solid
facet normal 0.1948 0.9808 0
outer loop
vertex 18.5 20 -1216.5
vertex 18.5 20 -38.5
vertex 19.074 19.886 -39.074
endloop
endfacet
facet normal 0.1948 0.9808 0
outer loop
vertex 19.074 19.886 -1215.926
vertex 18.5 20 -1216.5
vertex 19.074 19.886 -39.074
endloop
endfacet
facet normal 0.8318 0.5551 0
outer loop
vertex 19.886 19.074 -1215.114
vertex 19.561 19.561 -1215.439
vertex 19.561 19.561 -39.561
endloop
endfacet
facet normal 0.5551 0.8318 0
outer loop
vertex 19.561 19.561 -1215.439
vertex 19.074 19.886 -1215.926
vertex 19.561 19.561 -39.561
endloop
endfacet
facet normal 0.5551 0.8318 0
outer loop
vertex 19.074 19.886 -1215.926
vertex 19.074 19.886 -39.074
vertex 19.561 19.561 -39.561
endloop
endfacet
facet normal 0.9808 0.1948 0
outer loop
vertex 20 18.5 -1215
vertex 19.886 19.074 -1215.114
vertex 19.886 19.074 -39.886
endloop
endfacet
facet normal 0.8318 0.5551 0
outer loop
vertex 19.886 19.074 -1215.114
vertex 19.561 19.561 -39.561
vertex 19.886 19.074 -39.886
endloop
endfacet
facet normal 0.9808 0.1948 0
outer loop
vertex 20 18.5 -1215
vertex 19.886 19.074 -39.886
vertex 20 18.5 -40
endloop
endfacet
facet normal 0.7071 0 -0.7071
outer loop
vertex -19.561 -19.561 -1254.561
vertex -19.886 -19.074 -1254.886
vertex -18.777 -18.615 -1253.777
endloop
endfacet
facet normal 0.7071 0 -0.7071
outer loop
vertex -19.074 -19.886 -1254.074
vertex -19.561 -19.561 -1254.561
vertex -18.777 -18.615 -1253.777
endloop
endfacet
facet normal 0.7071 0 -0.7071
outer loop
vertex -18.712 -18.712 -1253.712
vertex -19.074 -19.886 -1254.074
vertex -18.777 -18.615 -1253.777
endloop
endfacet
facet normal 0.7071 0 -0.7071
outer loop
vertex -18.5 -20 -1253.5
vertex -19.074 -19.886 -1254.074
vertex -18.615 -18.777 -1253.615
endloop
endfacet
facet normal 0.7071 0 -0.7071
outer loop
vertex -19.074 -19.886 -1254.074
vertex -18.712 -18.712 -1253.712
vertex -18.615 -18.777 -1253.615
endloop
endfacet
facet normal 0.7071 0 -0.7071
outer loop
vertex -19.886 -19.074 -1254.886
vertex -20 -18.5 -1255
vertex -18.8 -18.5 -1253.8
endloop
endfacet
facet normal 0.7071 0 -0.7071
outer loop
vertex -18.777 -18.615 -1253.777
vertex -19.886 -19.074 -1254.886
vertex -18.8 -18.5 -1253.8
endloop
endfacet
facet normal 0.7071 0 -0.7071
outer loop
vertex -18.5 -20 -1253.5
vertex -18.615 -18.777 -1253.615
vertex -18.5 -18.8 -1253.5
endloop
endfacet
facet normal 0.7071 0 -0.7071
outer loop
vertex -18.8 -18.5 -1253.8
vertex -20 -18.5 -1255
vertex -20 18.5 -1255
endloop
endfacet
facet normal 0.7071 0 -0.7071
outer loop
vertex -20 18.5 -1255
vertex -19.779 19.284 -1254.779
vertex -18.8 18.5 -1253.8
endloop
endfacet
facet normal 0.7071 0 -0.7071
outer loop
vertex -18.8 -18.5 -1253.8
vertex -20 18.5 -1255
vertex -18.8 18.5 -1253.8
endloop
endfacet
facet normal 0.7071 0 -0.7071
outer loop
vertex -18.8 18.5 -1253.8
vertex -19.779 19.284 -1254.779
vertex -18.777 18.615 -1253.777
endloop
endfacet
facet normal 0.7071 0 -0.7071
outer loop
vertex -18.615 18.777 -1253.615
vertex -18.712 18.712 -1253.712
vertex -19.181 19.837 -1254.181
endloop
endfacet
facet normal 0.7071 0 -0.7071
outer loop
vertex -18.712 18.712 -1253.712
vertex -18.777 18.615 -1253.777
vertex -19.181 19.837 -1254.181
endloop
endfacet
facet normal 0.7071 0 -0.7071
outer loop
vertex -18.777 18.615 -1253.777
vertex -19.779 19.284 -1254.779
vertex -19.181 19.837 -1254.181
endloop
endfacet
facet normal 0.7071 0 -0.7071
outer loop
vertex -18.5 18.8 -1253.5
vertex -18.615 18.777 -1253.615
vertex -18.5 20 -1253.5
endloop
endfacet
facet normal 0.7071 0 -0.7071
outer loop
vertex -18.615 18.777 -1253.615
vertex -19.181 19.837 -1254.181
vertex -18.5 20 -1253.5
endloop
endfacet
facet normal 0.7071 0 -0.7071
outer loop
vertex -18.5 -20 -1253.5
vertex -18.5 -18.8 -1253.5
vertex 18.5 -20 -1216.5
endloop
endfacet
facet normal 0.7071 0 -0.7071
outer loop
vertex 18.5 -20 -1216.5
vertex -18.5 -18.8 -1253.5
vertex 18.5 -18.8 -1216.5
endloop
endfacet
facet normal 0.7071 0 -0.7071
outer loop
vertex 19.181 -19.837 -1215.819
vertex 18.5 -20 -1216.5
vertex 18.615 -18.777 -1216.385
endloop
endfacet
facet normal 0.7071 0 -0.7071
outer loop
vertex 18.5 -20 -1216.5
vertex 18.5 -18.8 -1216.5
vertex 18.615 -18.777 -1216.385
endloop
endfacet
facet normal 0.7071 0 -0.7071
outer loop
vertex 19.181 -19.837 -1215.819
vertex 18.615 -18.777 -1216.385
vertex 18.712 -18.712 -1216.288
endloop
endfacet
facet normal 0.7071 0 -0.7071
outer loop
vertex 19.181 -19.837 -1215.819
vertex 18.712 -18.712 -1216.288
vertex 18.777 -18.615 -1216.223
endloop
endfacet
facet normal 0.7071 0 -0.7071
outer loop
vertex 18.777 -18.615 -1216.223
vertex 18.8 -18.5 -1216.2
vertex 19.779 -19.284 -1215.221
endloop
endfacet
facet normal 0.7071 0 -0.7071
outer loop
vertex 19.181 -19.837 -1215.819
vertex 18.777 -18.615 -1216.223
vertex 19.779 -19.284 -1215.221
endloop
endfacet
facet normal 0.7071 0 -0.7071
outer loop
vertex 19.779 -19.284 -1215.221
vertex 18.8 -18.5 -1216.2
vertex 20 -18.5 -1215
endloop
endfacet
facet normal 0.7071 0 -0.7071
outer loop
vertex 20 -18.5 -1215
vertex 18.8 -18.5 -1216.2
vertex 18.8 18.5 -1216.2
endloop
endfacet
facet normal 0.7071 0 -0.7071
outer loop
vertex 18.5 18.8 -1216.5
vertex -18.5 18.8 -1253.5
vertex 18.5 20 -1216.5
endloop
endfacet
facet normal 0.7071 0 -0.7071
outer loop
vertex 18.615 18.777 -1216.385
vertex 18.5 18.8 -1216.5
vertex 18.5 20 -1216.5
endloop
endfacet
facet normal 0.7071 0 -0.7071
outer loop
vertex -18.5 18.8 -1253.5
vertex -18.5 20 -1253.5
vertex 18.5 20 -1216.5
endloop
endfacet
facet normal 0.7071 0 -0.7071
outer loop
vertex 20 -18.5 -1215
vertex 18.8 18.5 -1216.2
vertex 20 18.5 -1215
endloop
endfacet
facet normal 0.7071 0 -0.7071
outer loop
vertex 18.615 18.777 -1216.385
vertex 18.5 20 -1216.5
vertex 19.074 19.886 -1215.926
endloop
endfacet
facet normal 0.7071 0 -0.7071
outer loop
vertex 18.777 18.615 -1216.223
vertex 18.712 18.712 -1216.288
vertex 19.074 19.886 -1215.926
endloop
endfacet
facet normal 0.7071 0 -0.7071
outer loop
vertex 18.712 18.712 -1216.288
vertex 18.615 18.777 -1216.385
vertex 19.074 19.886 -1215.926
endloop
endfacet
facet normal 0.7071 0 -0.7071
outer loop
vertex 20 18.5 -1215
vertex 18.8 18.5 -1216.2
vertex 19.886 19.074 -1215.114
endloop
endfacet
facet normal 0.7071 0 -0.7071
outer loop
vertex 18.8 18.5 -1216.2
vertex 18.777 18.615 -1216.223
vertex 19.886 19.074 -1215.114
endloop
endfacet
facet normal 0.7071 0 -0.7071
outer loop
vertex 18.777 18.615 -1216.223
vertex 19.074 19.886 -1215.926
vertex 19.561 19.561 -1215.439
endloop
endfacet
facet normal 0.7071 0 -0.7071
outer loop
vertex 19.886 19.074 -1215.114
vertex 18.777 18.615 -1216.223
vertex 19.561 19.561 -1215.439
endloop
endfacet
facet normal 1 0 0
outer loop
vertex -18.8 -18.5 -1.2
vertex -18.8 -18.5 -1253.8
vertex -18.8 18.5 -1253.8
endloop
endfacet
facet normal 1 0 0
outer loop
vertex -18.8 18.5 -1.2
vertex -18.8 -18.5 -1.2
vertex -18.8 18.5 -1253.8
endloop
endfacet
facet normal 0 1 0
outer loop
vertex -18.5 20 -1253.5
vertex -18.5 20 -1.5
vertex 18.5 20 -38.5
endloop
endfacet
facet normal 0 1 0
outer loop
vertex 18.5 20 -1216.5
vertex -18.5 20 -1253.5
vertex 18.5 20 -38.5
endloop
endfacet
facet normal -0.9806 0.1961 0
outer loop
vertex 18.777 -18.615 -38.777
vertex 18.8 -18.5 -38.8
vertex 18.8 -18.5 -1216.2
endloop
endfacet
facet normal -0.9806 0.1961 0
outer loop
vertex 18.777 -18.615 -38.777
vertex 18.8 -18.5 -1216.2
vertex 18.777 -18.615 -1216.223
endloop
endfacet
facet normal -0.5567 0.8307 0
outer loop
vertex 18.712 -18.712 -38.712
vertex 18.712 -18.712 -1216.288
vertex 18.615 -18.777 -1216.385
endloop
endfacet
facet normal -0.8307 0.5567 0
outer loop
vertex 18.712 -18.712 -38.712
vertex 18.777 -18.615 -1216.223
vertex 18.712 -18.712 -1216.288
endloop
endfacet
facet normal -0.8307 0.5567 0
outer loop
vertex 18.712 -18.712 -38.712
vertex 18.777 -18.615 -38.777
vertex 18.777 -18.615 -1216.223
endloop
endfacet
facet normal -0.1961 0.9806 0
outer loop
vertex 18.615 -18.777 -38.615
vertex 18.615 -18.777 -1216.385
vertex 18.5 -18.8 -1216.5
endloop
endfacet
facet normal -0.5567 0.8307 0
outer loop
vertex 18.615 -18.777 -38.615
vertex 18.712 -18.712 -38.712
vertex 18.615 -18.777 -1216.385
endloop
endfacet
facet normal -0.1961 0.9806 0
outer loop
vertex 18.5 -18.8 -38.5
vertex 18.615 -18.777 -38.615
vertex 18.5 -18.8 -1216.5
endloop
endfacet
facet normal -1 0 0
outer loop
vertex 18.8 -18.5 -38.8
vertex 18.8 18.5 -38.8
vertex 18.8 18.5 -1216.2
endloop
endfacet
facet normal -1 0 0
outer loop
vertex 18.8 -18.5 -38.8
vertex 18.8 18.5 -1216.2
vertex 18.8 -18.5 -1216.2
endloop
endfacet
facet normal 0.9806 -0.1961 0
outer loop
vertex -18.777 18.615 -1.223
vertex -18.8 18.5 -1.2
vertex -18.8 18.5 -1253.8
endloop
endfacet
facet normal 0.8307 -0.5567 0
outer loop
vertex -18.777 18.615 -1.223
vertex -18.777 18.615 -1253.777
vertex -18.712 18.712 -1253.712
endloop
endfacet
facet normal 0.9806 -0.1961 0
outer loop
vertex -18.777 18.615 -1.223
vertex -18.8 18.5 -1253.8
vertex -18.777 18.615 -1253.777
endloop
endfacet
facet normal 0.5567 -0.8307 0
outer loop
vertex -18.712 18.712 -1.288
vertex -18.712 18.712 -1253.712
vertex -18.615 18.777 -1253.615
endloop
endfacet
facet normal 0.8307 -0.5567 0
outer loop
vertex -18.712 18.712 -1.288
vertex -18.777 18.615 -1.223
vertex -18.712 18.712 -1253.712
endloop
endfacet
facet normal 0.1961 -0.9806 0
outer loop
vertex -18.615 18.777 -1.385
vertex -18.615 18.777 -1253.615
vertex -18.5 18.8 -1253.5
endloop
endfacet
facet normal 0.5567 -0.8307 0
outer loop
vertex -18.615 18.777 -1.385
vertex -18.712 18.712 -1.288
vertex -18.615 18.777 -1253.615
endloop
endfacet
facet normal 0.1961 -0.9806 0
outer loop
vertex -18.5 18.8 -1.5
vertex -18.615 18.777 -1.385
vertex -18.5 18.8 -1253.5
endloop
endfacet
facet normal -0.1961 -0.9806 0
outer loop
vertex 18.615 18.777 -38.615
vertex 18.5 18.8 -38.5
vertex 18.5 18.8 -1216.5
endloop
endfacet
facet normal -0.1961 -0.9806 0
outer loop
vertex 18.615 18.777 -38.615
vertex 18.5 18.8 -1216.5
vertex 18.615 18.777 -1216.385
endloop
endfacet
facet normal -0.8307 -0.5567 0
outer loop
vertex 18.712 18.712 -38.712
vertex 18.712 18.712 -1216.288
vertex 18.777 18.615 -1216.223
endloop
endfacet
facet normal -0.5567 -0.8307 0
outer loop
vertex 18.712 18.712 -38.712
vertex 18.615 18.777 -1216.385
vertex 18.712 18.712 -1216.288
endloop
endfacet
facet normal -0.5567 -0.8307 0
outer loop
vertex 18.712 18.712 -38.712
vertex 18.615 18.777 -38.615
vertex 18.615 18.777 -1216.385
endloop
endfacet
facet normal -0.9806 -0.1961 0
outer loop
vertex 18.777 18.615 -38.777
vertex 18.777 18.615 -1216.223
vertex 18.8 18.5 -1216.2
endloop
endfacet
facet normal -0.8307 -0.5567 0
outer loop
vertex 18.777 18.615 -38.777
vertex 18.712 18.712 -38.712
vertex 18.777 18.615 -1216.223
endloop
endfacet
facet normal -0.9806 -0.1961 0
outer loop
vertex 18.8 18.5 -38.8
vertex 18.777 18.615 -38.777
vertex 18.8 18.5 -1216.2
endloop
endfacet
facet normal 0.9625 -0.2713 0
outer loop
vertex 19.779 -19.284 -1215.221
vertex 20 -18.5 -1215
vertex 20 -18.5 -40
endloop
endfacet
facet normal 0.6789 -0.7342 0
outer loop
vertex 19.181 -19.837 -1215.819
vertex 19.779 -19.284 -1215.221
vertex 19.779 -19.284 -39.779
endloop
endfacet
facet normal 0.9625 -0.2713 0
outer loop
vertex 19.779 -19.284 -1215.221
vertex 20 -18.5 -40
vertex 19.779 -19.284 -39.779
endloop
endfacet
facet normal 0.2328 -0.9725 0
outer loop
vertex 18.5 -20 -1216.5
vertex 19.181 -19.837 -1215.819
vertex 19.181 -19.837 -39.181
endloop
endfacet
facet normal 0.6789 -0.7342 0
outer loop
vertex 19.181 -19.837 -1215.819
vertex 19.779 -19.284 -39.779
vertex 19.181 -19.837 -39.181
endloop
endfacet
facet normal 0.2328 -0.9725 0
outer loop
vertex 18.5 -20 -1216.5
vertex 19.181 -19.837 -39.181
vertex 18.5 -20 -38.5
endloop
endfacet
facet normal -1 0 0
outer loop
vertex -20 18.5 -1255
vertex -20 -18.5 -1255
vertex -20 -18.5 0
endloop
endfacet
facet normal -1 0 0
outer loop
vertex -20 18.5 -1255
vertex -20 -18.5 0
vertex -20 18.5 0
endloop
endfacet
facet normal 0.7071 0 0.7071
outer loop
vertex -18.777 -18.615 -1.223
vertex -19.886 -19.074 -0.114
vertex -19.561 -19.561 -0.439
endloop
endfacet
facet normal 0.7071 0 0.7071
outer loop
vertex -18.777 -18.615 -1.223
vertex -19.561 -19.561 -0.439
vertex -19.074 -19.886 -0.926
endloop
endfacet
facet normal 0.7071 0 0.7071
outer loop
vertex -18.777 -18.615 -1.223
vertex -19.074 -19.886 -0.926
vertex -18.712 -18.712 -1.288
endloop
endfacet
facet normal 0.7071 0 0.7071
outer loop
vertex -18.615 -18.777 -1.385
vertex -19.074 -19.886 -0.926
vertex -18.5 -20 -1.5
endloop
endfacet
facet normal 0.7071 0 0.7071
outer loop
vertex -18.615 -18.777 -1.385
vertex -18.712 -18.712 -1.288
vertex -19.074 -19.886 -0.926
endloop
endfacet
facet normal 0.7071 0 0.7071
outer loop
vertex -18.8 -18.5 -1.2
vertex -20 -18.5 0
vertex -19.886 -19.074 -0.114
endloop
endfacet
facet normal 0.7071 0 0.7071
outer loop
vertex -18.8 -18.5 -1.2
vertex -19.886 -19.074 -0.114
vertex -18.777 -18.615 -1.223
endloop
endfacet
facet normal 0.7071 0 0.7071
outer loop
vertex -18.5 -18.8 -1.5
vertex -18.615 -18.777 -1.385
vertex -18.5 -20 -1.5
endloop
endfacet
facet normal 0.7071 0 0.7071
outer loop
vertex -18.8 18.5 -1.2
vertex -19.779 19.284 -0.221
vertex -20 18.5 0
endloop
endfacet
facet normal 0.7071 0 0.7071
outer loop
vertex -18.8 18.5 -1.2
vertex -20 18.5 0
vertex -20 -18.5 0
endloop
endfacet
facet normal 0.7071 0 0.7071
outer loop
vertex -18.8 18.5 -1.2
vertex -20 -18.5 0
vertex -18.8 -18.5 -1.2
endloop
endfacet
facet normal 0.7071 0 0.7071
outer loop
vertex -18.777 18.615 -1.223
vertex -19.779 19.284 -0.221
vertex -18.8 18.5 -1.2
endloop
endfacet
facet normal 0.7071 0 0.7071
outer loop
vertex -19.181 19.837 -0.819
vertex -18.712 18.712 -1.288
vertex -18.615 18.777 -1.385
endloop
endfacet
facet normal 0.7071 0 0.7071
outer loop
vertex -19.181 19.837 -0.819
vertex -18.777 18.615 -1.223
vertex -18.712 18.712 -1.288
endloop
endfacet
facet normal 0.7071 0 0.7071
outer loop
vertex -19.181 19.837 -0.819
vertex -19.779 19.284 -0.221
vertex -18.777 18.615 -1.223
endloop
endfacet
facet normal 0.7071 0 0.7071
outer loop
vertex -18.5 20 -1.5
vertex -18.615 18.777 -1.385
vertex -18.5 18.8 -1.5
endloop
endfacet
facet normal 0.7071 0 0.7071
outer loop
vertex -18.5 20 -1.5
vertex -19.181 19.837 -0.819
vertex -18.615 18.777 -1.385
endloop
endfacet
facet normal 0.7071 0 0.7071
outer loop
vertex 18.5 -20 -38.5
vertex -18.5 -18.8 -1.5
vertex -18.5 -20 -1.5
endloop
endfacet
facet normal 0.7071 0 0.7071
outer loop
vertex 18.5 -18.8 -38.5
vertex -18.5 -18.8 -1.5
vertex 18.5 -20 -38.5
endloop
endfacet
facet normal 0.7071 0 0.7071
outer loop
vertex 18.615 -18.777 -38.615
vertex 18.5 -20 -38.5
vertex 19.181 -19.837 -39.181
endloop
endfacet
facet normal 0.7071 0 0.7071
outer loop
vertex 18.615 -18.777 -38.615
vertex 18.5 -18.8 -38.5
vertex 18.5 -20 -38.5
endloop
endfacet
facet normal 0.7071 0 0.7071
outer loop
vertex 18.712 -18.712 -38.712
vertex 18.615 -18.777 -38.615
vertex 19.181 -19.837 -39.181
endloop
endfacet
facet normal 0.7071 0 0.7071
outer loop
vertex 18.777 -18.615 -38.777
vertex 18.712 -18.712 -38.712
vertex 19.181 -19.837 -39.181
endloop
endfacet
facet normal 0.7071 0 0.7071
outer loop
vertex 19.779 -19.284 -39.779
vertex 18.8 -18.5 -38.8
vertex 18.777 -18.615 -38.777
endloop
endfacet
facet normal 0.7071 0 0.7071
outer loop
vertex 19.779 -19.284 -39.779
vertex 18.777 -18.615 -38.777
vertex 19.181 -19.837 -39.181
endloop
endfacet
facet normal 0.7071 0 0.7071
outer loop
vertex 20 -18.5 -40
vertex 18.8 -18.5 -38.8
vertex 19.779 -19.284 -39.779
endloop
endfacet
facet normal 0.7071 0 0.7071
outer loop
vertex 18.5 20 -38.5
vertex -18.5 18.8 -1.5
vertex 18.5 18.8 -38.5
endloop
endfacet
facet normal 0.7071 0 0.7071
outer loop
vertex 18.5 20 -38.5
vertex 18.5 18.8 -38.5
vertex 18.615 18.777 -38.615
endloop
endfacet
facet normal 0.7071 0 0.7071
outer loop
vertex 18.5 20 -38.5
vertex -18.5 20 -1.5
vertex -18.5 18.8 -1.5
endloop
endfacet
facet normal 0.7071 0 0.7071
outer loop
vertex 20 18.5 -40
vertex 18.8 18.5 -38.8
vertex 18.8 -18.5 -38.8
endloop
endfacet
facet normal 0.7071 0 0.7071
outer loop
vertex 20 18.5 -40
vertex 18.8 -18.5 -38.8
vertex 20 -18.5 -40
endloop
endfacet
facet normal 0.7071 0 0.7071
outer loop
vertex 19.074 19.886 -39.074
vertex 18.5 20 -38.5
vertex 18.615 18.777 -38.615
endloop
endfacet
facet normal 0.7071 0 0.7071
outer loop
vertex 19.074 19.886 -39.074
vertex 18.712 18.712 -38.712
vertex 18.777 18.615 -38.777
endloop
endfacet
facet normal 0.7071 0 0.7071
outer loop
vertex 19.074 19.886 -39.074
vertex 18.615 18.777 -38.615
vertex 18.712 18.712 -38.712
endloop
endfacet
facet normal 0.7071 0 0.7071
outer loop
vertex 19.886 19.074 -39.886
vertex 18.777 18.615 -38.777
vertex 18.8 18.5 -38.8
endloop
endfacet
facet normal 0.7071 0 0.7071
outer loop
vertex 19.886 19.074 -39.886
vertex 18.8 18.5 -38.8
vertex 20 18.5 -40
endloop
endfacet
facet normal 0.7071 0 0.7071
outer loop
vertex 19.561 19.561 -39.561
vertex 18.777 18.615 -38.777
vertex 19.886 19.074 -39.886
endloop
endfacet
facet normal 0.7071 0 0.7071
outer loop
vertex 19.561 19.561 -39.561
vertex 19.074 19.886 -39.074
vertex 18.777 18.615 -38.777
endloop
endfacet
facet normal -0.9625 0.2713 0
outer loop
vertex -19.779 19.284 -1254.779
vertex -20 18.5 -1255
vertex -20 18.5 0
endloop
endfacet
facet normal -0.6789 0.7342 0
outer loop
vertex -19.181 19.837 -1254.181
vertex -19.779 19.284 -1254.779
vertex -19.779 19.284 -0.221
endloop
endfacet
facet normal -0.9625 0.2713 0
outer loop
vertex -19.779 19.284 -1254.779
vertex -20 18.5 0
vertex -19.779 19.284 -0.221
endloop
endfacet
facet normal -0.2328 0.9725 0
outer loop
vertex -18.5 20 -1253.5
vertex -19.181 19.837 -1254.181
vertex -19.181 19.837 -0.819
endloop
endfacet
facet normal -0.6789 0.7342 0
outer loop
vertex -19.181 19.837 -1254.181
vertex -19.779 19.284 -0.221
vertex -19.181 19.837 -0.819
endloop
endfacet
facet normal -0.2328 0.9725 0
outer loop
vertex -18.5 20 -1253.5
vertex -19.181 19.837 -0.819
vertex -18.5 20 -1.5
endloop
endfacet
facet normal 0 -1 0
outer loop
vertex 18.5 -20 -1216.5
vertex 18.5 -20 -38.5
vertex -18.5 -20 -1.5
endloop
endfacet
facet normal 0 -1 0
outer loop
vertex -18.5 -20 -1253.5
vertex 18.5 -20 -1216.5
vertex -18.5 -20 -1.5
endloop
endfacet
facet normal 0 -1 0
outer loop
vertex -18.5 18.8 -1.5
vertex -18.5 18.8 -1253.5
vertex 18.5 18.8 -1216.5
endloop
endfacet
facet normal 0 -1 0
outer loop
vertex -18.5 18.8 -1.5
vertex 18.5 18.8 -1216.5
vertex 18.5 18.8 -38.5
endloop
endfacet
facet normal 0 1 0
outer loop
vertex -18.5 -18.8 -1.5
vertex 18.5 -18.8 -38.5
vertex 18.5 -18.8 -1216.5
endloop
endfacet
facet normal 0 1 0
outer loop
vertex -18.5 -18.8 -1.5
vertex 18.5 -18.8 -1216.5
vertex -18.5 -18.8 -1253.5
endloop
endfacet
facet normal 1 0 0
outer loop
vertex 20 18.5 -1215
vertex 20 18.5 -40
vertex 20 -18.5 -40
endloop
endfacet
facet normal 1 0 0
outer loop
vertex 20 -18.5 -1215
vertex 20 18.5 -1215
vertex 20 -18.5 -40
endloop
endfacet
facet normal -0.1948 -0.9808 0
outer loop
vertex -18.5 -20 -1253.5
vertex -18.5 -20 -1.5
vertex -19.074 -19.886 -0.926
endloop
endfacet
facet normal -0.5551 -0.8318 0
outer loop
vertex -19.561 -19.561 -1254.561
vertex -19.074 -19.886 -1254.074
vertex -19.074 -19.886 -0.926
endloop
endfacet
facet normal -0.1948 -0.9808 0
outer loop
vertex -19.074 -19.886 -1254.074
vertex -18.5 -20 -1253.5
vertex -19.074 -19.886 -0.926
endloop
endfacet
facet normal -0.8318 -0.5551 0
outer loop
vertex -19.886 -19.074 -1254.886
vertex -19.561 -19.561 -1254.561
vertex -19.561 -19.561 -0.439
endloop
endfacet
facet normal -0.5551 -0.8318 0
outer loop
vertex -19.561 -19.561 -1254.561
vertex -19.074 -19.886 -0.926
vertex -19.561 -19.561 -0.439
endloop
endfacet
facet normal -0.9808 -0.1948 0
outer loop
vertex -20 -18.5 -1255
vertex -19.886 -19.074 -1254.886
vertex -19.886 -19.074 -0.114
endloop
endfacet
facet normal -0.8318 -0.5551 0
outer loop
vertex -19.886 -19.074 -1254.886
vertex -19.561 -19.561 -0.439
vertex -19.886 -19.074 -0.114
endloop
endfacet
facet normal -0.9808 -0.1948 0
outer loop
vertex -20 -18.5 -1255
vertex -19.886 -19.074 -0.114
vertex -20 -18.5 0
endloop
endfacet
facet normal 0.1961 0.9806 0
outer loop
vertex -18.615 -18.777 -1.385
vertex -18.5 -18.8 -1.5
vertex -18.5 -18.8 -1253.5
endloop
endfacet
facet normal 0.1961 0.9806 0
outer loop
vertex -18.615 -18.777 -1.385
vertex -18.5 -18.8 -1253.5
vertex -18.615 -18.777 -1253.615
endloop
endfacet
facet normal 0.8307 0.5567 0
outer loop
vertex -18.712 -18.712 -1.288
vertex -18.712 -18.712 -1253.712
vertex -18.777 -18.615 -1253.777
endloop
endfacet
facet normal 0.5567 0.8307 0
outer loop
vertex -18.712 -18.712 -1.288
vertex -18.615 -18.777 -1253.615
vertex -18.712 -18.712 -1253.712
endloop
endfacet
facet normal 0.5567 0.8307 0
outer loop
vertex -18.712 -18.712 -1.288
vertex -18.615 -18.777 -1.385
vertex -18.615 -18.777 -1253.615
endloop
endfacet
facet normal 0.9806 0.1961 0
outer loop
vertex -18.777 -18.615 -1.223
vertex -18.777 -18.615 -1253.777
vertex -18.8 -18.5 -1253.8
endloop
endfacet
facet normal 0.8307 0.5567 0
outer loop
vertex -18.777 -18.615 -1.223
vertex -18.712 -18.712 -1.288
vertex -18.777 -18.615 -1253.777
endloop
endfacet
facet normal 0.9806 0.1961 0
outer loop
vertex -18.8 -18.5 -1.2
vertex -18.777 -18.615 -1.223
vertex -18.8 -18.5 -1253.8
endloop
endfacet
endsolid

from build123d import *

# Parameters (mm, degrees)
STRUCTURAL_MEMBER1_DEPTH = 1255
CUT_EXTRUDE1_DEPTH       = 50


with BuildPart() as part:
    # Sketch12 → Structural Member1 (new body)
    with BuildSketch(Plane(origin=(0, 0, 0), x_dir=(-1, 0, 0), z_dir=(0, 0, -1))):
        with BuildLine():
            Line((-18.5, -20), (18.5, -20))
            ThreePointArc((18.5, -20), (19.560660172, -19.560660172), (20, -18.5))
            Line((20, -18.5), (20, 18.5))
            ThreePointArc((20, 18.5), (19.560660172, 19.560660172), (18.5, 20))
            Line((18.5, 20), (-18.5, 20))
            ThreePointArc((-18.5, 20), (-19.560660172, 19.560660172), (-20, 18.5))
            Line((-20, 18.5), (-20, -18.5))
            ThreePointArc((-20, -18.5), (-19.560660172, -19.560660172), (-18.5, -20))
        make_face()
        with BuildLine():
            Line((-18.5, -18.8), (18.5, -18.8))
            ThreePointArc((18.5, -18.8), (18.712132034, -18.712132034), (18.8, -18.5))
            Line((18.8, -18.5), (18.8, 18.5))
            ThreePointArc((18.8, 18.5), (18.712132034, 18.712132034), (18.5, 18.8))
            Line((18.5, 18.8), (-18.5, 18.8))
            ThreePointArc((-18.5, 18.8), (-18.712132034, 18.712132034), (-18.8, 18.5))
            Line((-18.8, 18.5), (-18.8, -18.5))
            ThreePointArc((-18.8, -18.5), (-18.712132034, -18.712132034), (-18.5, -18.8))
        make_face(mode=Mode.SUBTRACT)
    extrude(amount=STRUCTURAL_MEMBER1_DEPTH)

    # Sketch13 → Cut-Extrude1 (cut)
    with BuildSketch(Plane(origin=(0, 20, 0), x_dir=(1, 0, 0), z_dir=(0, 1, 0))):
        Polygon((-20, 1255), (31.574006929, 1203.425993071), (31.574006929, 1272.147428422), align=None)
        Polygon((31.574006929, -17.147428422), (-20, 0), (31.574006929, 51.574006929), align=None)
    extrude(amount=-CUT_EXTRUDE1_DEPTH, mode=Mode.SUBTRACT)


solid = part.part
